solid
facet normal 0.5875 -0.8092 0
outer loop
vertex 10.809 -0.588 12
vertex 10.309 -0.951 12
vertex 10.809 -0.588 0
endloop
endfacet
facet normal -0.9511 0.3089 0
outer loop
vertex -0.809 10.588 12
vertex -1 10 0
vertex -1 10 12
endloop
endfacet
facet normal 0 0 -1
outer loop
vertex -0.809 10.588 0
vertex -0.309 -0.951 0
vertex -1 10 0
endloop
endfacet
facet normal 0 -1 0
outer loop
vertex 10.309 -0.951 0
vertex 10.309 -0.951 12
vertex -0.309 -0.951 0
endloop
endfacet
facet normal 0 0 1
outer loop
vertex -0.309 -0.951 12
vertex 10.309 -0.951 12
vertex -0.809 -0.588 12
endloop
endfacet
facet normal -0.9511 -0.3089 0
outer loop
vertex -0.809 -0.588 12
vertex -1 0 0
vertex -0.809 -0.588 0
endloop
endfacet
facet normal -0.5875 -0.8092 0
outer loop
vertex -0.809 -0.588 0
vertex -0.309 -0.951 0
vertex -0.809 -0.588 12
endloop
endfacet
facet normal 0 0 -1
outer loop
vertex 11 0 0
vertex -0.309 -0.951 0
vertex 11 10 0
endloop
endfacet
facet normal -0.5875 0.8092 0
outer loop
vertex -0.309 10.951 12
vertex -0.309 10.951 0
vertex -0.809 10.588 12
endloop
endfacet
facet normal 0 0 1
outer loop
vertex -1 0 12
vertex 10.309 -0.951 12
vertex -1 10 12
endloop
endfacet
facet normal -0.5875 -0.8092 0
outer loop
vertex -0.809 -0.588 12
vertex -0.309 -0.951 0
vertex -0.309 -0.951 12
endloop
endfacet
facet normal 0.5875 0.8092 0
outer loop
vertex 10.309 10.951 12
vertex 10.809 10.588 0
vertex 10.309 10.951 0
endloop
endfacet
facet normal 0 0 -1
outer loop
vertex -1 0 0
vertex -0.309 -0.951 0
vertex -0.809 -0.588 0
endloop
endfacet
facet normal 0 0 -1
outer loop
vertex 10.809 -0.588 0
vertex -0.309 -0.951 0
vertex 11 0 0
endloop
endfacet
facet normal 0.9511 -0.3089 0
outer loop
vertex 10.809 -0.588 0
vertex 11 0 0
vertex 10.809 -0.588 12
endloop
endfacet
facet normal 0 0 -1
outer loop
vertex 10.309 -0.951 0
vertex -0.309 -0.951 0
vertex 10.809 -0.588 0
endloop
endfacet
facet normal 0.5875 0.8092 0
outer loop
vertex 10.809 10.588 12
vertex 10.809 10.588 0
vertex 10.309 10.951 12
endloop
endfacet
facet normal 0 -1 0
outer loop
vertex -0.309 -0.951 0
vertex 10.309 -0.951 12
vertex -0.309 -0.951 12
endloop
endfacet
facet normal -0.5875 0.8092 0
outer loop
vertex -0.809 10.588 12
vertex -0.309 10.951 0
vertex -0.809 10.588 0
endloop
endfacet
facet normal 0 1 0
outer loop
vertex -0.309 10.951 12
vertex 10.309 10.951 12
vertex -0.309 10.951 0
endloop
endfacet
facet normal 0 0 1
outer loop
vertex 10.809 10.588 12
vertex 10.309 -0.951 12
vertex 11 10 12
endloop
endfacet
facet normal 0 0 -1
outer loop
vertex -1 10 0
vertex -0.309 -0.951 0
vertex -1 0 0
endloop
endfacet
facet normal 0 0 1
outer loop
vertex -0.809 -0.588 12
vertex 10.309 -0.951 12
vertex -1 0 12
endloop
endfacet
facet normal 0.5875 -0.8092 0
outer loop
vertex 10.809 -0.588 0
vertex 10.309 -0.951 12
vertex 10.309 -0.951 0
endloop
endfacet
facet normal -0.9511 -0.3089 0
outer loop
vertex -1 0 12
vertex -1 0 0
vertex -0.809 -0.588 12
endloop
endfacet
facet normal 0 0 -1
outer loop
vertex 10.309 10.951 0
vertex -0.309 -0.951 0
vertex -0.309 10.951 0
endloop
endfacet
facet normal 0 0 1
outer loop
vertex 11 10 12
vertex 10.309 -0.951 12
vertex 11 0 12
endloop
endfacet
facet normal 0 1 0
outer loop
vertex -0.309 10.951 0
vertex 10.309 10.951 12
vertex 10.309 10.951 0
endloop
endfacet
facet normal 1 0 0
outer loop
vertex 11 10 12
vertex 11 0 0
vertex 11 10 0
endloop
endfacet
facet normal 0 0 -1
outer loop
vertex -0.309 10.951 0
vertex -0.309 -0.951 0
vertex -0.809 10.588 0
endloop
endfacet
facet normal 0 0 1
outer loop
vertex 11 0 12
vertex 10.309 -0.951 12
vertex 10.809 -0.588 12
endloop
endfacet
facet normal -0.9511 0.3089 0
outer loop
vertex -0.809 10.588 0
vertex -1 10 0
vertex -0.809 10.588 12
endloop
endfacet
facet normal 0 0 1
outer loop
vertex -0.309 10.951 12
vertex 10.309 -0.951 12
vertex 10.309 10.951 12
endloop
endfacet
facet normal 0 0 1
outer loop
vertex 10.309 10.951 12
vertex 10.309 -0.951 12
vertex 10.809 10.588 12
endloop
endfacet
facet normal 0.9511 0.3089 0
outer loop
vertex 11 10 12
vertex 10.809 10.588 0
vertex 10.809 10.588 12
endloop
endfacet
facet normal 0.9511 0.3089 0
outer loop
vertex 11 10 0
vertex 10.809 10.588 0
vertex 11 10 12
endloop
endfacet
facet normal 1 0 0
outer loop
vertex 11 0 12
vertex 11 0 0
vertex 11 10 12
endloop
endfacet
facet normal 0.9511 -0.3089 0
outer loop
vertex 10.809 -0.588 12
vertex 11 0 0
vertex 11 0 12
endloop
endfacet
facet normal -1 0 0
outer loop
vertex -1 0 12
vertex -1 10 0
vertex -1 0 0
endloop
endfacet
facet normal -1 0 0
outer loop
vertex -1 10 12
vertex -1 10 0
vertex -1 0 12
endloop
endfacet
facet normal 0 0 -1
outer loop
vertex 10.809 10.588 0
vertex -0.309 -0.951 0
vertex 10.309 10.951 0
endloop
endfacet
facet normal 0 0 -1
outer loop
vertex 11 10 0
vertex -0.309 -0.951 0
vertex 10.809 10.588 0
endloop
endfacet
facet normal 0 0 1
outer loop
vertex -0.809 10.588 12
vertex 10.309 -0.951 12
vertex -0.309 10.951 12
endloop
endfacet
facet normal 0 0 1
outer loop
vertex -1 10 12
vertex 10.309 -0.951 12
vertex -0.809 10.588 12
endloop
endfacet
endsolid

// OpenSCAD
$fn = 10;

phone_height = 145.17;
phone_width = 70.49;
phone_thickness = 7.45;
phone_corner_radis = 10;

module mycylinder(){
    color("red") cylinder(d=2,h=2);
}

module mycube(){
    color("yellow") cube([10,10,10]);
}

minkowski(){
    mycylinder();
    mycube();
}
